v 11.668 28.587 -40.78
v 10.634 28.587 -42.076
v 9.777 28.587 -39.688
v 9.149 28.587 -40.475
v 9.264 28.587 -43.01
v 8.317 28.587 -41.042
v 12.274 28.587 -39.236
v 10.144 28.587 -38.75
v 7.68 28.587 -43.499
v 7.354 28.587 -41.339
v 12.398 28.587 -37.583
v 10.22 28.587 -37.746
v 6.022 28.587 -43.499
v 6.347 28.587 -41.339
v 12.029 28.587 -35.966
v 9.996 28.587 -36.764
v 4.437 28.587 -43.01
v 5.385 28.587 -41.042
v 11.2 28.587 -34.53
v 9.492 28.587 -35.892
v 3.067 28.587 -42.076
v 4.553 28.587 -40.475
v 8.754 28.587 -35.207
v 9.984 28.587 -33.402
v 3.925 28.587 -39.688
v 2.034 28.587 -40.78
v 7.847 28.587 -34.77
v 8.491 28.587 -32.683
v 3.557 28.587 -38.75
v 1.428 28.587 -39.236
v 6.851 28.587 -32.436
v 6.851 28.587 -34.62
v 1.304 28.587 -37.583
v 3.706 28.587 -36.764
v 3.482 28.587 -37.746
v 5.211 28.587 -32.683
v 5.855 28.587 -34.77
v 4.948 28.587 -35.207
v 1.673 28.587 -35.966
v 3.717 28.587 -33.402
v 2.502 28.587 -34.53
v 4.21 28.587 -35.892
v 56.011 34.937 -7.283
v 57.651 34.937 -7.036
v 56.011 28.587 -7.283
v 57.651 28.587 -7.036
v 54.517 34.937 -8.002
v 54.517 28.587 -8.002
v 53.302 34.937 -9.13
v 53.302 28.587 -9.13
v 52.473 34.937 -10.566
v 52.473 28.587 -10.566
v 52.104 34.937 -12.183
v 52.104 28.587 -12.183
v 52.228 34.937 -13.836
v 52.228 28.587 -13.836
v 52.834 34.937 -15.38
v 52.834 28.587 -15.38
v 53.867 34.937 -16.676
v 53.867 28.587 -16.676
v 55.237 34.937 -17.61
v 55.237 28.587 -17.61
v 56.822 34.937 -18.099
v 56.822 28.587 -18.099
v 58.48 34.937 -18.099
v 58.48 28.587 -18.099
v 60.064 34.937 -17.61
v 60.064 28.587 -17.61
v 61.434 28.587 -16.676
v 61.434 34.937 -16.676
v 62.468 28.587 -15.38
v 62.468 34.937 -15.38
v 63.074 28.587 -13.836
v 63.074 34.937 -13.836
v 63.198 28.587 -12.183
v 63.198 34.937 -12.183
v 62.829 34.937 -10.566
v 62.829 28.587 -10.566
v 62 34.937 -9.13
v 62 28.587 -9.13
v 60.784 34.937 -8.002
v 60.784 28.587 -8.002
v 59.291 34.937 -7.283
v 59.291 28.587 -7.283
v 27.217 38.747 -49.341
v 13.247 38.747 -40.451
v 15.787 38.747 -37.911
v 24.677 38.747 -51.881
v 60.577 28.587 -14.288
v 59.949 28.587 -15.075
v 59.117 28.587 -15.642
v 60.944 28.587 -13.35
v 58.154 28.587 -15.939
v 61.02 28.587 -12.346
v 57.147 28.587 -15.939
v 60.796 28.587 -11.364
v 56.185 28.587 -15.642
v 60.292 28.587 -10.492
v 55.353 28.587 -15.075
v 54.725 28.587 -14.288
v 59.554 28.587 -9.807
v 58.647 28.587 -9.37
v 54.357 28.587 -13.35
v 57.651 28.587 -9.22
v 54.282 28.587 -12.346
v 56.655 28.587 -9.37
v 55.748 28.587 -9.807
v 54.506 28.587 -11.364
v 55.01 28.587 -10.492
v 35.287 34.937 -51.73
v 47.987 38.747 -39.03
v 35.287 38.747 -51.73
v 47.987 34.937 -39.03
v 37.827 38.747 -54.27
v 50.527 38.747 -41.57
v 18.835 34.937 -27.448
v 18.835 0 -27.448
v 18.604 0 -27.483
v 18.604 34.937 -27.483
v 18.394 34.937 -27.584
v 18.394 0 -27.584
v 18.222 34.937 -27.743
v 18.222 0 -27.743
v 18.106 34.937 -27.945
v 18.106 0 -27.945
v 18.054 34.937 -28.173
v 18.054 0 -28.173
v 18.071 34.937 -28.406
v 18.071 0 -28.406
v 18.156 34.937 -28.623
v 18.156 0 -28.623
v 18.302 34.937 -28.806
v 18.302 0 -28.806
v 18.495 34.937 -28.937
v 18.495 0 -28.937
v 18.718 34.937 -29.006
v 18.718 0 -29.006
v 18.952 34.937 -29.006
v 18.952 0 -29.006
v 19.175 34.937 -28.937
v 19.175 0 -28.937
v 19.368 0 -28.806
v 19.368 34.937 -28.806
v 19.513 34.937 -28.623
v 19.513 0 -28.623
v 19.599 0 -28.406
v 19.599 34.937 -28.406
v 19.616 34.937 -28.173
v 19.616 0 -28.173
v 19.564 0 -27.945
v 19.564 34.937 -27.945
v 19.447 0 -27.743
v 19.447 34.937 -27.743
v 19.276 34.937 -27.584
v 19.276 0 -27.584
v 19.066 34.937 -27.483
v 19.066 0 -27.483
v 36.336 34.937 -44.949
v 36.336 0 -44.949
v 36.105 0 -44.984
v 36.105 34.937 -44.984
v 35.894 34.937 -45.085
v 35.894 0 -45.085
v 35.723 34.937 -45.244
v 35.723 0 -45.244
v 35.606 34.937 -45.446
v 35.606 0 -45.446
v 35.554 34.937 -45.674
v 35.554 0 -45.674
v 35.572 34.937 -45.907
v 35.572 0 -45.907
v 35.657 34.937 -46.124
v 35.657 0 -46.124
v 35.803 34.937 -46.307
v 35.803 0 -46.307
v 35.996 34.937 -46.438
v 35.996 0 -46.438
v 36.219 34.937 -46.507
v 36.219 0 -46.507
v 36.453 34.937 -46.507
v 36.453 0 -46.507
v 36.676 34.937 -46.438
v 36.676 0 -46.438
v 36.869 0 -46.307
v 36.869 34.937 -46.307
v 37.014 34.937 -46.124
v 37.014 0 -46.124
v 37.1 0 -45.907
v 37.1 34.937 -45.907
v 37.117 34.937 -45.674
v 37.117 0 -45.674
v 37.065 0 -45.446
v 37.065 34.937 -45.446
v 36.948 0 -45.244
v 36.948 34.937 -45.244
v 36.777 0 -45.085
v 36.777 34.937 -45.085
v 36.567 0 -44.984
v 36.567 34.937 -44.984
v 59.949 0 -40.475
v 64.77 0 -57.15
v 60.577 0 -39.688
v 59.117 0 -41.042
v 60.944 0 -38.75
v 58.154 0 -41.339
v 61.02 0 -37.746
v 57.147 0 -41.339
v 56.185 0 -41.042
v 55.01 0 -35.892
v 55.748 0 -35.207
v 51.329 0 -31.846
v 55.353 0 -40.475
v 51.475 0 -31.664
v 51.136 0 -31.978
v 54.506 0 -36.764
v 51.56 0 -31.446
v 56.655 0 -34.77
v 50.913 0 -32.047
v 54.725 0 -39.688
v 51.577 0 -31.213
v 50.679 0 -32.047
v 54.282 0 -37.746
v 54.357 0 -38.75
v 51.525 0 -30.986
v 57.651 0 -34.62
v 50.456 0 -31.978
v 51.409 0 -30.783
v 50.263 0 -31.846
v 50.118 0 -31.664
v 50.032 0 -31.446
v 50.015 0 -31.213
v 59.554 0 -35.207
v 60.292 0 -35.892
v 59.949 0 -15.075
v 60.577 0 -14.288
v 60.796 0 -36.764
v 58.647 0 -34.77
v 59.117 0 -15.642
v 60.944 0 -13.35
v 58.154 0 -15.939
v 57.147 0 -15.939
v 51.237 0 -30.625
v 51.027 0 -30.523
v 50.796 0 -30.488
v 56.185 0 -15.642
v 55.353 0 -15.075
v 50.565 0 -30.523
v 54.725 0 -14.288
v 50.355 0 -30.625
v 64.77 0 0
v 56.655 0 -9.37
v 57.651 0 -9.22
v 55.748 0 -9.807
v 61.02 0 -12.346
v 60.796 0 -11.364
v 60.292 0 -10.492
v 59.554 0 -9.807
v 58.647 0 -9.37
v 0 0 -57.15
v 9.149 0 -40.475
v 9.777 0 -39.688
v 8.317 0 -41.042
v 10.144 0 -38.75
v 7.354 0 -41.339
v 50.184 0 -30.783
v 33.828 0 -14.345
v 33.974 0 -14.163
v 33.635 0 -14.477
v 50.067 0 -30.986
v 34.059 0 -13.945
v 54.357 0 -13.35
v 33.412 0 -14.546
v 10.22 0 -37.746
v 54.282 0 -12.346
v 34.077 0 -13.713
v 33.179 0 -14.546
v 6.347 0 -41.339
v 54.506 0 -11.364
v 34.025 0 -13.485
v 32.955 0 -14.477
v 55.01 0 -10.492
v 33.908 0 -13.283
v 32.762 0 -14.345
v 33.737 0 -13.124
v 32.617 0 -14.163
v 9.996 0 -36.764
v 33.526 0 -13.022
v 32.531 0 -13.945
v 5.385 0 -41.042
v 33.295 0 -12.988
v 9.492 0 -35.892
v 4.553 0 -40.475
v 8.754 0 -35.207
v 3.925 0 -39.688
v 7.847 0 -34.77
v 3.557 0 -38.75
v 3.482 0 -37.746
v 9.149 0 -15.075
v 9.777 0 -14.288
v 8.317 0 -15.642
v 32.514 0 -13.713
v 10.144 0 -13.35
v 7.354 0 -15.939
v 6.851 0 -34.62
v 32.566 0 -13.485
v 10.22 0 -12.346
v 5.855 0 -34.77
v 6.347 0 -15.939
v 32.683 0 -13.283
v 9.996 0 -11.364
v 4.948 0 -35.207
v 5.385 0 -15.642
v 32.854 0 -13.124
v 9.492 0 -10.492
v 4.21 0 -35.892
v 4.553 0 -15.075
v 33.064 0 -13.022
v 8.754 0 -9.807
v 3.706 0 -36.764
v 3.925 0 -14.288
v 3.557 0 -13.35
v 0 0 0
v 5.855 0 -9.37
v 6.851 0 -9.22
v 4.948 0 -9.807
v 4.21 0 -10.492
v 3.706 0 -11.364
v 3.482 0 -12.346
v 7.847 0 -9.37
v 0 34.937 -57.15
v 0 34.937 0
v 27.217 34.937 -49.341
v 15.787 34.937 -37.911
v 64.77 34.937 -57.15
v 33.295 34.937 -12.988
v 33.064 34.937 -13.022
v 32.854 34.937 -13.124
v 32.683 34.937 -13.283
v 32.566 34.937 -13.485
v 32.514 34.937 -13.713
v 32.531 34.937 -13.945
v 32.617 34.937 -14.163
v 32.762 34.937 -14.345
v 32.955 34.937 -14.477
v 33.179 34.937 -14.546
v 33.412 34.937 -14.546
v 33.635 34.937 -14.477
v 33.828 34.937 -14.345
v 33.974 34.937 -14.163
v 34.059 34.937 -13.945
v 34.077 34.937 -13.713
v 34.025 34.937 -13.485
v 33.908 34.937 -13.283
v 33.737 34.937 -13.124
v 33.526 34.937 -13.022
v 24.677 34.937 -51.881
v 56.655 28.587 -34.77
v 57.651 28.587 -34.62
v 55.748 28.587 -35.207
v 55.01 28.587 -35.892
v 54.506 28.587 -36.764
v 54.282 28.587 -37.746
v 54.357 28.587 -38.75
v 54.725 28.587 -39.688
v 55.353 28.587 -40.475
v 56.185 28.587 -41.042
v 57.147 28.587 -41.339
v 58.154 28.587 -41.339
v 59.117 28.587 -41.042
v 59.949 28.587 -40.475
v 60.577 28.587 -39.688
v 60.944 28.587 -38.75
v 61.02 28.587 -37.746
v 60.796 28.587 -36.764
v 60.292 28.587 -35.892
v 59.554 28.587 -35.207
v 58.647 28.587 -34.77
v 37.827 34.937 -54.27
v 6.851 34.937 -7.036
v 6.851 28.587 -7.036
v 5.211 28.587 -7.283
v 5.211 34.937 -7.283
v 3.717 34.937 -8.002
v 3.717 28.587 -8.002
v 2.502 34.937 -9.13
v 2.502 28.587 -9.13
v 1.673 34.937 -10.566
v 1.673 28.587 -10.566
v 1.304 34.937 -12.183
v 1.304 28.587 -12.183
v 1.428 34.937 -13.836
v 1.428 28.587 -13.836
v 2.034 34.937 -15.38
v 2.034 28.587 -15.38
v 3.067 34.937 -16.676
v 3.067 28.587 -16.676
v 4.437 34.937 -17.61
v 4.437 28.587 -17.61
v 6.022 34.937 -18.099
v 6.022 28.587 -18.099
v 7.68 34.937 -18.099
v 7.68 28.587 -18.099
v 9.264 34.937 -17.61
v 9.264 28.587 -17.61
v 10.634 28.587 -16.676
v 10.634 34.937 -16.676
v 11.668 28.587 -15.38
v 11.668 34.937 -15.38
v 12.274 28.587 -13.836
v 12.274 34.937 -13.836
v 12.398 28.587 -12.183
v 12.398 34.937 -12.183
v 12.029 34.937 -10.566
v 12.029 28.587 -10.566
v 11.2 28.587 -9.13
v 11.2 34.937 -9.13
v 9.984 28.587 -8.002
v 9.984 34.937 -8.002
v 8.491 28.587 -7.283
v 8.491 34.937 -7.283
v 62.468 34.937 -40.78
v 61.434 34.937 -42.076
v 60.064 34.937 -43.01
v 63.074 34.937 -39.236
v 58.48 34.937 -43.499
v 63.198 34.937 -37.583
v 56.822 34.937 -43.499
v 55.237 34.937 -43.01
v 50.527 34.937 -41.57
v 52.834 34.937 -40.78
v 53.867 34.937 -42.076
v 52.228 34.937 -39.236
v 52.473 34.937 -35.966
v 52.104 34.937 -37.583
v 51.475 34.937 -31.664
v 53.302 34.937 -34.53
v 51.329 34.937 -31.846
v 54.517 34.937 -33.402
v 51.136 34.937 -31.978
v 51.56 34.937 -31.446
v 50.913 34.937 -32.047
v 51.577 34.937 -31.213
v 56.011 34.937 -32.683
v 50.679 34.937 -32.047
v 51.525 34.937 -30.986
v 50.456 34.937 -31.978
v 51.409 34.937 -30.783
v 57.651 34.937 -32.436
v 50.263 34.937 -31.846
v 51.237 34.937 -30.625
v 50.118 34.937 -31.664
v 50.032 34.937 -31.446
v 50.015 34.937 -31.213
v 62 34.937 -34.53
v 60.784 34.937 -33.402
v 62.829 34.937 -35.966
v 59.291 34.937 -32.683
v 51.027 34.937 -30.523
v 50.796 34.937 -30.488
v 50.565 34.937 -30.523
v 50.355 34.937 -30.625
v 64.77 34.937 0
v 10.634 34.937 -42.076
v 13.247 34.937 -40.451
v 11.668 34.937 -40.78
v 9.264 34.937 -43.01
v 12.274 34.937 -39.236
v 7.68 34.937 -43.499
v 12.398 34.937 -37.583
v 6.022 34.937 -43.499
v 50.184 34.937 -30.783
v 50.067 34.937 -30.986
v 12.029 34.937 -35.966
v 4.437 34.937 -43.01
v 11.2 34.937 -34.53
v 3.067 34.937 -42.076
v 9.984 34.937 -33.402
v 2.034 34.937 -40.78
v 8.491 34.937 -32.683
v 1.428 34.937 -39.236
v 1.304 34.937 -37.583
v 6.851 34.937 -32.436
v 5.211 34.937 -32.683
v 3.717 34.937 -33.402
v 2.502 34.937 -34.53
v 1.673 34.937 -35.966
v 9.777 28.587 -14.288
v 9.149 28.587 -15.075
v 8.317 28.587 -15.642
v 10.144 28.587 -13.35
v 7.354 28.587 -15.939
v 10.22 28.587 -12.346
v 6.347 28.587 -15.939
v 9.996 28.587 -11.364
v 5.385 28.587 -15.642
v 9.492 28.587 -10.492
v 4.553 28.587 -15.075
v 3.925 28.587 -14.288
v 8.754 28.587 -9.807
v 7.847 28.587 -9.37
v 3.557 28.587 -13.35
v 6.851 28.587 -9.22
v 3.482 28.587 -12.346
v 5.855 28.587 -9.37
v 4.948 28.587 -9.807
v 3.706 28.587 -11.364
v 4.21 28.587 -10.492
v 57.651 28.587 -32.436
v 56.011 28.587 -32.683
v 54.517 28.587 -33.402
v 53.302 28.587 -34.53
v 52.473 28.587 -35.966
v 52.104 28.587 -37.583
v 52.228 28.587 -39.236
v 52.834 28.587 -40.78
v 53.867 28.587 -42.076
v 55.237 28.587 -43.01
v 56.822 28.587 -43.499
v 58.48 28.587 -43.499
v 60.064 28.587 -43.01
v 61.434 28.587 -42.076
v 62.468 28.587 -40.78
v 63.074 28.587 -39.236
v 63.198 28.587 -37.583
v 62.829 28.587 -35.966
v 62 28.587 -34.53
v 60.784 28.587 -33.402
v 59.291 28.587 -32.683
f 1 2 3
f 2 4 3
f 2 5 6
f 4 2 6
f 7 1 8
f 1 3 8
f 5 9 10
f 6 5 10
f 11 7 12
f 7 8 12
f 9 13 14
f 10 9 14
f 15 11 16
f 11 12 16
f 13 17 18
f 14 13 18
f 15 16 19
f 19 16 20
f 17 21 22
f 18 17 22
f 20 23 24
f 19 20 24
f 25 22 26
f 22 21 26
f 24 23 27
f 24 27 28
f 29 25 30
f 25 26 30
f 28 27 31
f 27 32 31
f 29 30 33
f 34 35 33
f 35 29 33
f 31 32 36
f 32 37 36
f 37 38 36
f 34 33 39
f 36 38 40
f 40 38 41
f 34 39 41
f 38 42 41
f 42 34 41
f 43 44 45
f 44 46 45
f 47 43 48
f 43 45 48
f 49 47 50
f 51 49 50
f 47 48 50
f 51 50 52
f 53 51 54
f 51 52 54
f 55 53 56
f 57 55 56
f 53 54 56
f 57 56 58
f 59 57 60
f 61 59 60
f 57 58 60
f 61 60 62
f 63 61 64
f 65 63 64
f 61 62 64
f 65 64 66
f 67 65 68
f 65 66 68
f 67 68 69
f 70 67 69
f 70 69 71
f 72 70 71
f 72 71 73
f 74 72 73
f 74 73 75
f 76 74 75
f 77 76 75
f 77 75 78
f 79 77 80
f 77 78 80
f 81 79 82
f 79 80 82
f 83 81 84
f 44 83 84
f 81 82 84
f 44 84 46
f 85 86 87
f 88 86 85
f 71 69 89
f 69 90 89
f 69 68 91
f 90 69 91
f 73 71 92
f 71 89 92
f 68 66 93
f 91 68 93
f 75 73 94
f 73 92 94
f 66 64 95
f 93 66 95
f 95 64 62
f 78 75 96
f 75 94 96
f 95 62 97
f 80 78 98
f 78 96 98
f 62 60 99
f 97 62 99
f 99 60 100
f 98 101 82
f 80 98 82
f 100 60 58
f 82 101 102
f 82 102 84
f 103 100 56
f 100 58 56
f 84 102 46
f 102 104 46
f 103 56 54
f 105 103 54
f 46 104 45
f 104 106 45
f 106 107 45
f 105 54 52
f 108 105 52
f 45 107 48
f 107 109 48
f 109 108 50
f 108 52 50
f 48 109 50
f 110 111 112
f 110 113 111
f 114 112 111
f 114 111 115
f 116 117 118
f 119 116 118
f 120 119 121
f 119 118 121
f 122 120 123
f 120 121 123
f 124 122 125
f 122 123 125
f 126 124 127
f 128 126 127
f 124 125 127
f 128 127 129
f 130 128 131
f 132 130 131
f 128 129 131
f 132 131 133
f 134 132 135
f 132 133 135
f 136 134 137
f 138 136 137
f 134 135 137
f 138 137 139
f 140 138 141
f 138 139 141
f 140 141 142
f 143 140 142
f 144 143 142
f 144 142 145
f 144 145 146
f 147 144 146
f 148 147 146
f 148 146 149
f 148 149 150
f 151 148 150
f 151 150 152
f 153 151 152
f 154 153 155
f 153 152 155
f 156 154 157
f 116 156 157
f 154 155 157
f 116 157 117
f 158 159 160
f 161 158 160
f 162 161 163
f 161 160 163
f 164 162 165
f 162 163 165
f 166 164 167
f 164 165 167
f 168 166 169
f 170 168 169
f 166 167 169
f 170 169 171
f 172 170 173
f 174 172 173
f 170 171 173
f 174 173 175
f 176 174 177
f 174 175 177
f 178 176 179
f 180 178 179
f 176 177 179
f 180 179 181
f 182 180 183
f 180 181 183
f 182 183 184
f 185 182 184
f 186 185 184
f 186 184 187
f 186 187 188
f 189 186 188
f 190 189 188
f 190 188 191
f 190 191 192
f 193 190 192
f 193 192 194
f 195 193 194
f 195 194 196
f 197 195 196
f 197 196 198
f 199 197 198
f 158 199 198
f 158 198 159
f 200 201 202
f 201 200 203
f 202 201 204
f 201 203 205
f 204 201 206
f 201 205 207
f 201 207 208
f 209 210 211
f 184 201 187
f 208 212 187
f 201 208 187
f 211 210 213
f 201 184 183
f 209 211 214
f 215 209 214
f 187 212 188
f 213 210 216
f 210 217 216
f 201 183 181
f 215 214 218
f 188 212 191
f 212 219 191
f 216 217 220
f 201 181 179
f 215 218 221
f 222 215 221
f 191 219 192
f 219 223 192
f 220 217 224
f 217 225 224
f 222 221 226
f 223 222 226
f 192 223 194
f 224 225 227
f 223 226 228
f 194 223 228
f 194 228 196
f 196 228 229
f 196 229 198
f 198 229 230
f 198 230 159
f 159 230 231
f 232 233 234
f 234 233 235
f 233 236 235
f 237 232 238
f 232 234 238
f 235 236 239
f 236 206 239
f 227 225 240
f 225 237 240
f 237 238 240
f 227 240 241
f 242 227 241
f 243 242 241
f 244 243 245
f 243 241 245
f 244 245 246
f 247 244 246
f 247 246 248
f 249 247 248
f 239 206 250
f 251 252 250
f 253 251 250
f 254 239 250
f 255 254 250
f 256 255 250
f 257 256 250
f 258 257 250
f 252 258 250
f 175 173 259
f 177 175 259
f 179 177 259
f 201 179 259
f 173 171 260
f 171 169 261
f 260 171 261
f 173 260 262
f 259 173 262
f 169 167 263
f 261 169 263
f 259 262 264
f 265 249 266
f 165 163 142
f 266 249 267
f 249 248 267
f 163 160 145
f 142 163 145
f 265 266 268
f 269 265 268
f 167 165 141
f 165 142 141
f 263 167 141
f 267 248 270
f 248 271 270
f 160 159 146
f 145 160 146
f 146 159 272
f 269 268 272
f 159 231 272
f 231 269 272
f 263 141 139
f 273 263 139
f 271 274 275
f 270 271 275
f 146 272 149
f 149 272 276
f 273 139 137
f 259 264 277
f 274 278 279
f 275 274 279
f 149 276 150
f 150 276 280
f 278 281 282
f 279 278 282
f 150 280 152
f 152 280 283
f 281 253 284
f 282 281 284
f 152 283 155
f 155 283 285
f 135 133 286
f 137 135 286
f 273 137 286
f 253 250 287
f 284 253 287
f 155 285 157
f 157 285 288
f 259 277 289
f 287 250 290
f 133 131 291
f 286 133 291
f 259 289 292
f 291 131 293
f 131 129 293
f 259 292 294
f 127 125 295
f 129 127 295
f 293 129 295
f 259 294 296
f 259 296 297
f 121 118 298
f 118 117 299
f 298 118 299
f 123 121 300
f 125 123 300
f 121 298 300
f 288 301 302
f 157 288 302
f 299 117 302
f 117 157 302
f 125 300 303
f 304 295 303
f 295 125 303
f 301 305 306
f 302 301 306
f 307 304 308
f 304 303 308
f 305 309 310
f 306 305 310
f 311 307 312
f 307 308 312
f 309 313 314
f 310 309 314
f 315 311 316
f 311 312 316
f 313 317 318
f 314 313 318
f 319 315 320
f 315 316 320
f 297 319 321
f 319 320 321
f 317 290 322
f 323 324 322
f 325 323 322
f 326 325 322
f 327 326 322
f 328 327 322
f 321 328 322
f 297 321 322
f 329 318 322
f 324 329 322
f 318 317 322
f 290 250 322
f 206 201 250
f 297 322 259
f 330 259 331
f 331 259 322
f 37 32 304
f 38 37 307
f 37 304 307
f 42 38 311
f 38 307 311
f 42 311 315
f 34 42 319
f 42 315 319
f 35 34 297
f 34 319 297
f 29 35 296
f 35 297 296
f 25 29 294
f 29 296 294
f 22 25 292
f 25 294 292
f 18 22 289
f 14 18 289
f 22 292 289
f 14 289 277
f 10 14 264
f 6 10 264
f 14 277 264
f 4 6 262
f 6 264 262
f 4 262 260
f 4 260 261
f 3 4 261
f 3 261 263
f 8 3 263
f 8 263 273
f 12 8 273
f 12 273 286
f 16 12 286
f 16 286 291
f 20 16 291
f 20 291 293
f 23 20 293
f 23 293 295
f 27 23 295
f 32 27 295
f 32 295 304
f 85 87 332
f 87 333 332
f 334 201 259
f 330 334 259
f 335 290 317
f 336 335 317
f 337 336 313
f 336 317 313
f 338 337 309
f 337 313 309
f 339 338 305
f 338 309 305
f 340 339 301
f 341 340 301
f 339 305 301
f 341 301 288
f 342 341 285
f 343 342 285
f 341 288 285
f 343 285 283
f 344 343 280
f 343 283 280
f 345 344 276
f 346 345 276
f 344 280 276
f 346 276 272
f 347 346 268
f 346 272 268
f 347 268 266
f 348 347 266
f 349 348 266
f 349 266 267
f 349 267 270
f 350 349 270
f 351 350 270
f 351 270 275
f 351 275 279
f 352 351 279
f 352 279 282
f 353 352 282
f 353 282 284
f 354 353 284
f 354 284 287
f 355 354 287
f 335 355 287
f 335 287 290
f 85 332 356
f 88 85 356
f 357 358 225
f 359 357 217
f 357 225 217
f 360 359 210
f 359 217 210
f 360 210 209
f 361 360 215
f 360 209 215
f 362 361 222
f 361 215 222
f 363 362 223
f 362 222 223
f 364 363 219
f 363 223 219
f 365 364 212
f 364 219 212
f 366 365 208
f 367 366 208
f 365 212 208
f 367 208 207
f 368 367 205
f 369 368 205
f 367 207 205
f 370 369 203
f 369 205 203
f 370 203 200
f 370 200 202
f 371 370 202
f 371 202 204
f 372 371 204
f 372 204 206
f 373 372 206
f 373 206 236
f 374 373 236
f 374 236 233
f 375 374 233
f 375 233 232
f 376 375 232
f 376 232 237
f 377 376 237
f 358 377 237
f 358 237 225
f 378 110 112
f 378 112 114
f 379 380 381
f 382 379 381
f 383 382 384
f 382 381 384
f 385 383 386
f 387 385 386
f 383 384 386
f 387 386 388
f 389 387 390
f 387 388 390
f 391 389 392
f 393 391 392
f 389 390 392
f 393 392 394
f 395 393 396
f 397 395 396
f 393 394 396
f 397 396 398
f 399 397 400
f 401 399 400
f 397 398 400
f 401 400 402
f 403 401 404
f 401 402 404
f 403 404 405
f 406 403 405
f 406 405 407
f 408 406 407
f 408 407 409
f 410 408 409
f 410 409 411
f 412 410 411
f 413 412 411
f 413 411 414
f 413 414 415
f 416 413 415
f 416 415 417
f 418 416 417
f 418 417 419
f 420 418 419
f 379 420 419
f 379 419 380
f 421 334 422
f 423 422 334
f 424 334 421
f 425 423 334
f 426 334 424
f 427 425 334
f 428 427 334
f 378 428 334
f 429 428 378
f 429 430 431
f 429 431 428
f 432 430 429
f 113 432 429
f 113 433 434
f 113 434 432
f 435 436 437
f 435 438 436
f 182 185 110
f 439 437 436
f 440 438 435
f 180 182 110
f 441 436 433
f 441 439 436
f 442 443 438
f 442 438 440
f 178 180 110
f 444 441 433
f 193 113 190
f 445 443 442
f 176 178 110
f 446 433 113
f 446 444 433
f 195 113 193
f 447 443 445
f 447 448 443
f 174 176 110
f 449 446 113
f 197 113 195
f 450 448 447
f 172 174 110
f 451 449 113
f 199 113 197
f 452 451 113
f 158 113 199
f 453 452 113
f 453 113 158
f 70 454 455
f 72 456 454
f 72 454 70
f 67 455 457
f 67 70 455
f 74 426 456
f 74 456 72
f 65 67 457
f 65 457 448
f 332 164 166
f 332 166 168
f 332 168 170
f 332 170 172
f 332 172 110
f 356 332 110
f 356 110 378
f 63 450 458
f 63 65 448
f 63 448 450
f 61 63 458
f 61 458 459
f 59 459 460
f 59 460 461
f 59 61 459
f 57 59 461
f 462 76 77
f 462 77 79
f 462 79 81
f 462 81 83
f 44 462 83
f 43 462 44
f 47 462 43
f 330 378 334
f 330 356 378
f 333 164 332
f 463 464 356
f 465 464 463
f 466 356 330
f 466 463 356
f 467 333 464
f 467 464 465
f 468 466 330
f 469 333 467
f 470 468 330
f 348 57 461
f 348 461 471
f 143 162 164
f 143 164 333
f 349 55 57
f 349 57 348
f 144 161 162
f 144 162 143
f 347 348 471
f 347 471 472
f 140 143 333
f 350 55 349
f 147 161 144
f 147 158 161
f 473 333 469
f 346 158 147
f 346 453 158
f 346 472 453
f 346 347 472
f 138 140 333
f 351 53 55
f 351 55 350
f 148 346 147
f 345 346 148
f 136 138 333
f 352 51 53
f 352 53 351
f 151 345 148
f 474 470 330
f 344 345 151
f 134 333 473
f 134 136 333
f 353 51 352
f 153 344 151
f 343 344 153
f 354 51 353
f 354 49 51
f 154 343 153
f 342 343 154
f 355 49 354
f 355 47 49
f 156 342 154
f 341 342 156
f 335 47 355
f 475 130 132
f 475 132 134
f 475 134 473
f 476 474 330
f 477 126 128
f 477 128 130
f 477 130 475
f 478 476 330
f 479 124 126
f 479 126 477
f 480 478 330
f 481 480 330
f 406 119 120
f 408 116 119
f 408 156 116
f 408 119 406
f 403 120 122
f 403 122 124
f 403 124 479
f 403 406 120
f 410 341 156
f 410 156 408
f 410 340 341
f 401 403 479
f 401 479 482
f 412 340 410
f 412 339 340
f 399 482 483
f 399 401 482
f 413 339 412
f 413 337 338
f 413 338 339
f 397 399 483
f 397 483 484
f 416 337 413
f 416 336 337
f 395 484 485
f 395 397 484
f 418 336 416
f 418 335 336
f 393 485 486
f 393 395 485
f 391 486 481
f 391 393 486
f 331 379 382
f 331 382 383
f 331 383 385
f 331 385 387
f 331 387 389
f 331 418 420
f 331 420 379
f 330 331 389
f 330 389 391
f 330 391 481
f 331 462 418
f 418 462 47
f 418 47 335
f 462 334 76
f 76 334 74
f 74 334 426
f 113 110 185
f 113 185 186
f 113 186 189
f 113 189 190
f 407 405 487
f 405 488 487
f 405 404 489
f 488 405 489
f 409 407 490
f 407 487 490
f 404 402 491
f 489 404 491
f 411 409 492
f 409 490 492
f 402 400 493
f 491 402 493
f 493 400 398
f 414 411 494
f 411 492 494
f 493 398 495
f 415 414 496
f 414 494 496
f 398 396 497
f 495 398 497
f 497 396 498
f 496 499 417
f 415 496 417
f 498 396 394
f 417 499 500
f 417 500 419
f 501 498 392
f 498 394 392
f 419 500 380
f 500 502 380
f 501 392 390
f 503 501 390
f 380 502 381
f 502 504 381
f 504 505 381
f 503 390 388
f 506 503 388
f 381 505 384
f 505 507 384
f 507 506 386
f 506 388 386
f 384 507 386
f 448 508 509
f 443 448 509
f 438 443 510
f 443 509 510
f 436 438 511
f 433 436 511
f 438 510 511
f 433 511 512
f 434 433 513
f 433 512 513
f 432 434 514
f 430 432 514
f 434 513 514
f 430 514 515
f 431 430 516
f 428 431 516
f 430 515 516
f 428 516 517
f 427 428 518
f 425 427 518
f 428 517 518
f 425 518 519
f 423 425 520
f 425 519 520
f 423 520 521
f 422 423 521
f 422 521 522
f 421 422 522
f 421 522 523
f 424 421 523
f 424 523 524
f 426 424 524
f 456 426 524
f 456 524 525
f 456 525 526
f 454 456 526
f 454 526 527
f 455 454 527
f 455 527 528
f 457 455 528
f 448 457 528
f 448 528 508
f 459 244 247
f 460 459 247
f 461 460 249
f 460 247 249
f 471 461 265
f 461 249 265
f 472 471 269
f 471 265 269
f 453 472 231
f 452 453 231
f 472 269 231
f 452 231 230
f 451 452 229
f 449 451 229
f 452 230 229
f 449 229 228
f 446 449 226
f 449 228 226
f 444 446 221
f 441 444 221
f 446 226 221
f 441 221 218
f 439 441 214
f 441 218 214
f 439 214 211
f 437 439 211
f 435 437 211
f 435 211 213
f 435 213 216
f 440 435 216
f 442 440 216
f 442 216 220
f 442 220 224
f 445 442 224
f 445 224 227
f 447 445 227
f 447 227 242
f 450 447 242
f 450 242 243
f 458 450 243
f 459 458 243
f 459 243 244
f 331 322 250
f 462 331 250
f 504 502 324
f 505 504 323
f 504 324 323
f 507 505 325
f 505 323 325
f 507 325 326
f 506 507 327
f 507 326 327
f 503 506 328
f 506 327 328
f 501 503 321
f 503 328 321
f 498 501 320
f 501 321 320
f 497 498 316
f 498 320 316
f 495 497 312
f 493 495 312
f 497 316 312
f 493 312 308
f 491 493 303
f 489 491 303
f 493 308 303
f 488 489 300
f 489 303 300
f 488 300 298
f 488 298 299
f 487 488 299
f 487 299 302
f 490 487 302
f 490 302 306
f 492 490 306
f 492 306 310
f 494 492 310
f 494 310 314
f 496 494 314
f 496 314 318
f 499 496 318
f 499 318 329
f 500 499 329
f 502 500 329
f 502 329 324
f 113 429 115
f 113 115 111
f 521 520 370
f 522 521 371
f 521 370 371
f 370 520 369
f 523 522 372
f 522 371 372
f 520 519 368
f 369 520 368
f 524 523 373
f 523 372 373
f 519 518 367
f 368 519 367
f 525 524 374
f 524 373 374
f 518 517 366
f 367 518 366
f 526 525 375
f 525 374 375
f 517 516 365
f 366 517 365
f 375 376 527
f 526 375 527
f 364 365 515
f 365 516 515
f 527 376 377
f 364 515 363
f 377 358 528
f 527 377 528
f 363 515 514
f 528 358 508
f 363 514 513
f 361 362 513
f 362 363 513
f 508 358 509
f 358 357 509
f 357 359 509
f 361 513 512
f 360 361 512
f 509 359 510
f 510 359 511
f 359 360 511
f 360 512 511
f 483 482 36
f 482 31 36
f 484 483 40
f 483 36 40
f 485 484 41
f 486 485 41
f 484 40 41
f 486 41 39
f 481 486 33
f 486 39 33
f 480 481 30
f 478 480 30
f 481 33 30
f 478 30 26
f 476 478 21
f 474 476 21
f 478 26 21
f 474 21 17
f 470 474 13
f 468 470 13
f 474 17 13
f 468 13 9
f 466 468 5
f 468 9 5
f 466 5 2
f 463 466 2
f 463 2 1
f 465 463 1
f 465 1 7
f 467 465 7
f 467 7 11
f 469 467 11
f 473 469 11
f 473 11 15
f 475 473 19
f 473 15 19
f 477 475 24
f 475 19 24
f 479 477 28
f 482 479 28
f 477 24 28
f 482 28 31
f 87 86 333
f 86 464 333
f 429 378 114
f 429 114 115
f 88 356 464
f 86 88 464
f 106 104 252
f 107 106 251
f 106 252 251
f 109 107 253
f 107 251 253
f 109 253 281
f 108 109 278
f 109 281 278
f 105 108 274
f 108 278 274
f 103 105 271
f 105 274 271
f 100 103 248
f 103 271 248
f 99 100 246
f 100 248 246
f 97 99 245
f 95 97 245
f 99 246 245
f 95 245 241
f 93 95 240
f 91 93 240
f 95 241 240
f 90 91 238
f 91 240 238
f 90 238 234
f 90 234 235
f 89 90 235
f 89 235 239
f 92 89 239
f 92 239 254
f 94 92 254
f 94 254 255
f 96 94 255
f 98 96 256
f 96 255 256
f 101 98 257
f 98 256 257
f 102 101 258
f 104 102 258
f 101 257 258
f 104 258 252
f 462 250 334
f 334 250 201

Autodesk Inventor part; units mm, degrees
ref_plane "YZ Plane" through (0, 0, 0) normal (1, 0, 0) x (0, 1, 0)
ref_plane "XZ Plane" through (0, 0, 0) normal (0, 1, 0) x (-1, 0, 0)
ref_plane "XY Plane" through (0, 0, 0) normal (0, 0, 1) x (1, 0, 0)
sketch "Sketch1" plane through (0, 0, 0) normal (0, 1, 0) x (-1, 0, 0)
  line L0 (0, 0) -> (-64.77, 0)
  line L1 (-64.77, 0) -> (-64.77, -57.15)
  line L2 (-64.77, -57.15) -> (0, -57.15)
  line L3 (0, -57.15) -> (0, 0)
  dimension "d0" = 64.77
  dimension "d1" = 57.15
extrude "Extrusion1" add sketch "Sketch1" along normal blind 34.9368
sketch "Sketch2" plane through (0, 34.9368, 0) normal (0, 1, 0) x (1, 0, 0)
  circle A0 centre (33.2953, 13.7711) radius 1.27
  line L0 (0, 0) -> (64.77, 0) projected
  line L1 (0, 57.15) -> (0, 0) projected
  circle A1 centre (18.8349, 28.2314) radius 1.27
  circle A2 centre (36.3358, 45.7323) radius 1.27
  line L2 (64.77, 57.15) -> (0, 57.15) projected
  circle A3 centre (50.7961, 31.2719) radius 1.27
  dimension "d4" = 13.7711
  dimension "d5" = 33.2953
  dimension "d6" = 2.54
  dimension "d7" = 2.54
  dimension "d8" = 28.2314
  dimension "d9" = 18.8349
  dimension "d10" = 2.54
  dimension "d11" = 11.4177
  dimension "d12" = 36.3358
  dimension "d13" = 2.54
  dimension "d14" = 25.8781
  dimension "d15" = 50.7961
hole "Hole1" at (50.7961, 34.9368, -31.2719) at (36.3358, 34.9368, -45.7323) at (18.8349, 34.9368, -28.2314) at (33.2953, 34.9368, -13.7711) direction (0, -1, 0) diameter 1.567 end through all thread size "M2x0.4" class "6H" standard "ANSI Metric M Profile"
sketch "Sketch3" plane through (0, 34.9368, 0) normal (0, 1, 0) x (1, 0, 0)
  circle A0 centre (6.8509, 12.5984) radius 1.27
  line L0 (0, 0) -> (64.77, 0) projected
  line L1 (0, 57.15) -> (0, 0) projected
  circle A1 centre (6.8509, 37.9984) radius 1.27
  circle A2 centre (57.6509, 37.9984) radius 1.27
  circle A3 centre (57.6509, 12.5984) radius 1.27
  dimension "d23" = 2.54
  dimension "d24" = 12.5984
  dimension "d25" = 6.8509
  dimension "d26" = 2.54
  dimension "d27" = 25.4
  dimension "d28" = 2.54
  dimension "d29" = 50.8
  dimension "d30" = 2.54
  dimension "d31" = 50.8
hole "Hole2" at (57.6509, 34.9368, -37.9984) at (57.6509, 34.9368, -12.5984) at (6.8509, 34.9368, -12.5984) at (6.8509, 34.9368, -37.9984) direction (0, -1, 0) diameter 6.7564 end through all counterbore diameter 11.1252 counterbore depth 6.35 clearance for "Socket Head Cap Screw" size "1/4" standard "Ansi Unified Screw Threads"
sketch "Sketch4" plane through (0, 34.9368, 0) normal (0, 1, 0) x (1, 0, 0)
  line L0 (15.7866, 37.911) -> (27.2166, 49.341)
  line L1 (27.2166, 49.341) -> (24.6766, 51.881)
  line L2 (24.6766, 51.881) -> (13.2466, 40.451)
  line L3 (13.2466, 40.451) -> (15.7866, 37.911)
  line L4 (0, 57.15) -> (0, 0) projected
  dimension "d39" = 45
  dimension "d40" = 24.7669
  dimension "d41" = 2.54
  dimension "d42" = 11.43
extrude "Extrusion2" add sketch "Sketch4" along normal blind 3.81
sketch "Sketch5" plane through (0, 34.9368, 0) normal (0, 1, 0) x (1, 0, 0)
  line L0 (47.9873, 39.0305) -> (35.2873, 51.7305)
  line L1 (35.2873, 51.7305) -> (37.8273, 54.2705)
  line L2 (37.8273, 54.2705) -> (50.5273, 41.5705)
  line L3 (50.5273, 41.5705) -> (47.9873, 39.0305)
  line L4 (64.77, 0) -> (64.77, 57.15) projected
  point P0 (0, 0)
  dimension "d45" = 2.54
  dimension "d46" = 12.7
  dimension "d47" = 45
  dimension "d48" = 24.6795
extrude "Extrusion3" add sketch "Sketch5" along normal blind 3.81
properties part number "ResGalvoMount_base_plate"
